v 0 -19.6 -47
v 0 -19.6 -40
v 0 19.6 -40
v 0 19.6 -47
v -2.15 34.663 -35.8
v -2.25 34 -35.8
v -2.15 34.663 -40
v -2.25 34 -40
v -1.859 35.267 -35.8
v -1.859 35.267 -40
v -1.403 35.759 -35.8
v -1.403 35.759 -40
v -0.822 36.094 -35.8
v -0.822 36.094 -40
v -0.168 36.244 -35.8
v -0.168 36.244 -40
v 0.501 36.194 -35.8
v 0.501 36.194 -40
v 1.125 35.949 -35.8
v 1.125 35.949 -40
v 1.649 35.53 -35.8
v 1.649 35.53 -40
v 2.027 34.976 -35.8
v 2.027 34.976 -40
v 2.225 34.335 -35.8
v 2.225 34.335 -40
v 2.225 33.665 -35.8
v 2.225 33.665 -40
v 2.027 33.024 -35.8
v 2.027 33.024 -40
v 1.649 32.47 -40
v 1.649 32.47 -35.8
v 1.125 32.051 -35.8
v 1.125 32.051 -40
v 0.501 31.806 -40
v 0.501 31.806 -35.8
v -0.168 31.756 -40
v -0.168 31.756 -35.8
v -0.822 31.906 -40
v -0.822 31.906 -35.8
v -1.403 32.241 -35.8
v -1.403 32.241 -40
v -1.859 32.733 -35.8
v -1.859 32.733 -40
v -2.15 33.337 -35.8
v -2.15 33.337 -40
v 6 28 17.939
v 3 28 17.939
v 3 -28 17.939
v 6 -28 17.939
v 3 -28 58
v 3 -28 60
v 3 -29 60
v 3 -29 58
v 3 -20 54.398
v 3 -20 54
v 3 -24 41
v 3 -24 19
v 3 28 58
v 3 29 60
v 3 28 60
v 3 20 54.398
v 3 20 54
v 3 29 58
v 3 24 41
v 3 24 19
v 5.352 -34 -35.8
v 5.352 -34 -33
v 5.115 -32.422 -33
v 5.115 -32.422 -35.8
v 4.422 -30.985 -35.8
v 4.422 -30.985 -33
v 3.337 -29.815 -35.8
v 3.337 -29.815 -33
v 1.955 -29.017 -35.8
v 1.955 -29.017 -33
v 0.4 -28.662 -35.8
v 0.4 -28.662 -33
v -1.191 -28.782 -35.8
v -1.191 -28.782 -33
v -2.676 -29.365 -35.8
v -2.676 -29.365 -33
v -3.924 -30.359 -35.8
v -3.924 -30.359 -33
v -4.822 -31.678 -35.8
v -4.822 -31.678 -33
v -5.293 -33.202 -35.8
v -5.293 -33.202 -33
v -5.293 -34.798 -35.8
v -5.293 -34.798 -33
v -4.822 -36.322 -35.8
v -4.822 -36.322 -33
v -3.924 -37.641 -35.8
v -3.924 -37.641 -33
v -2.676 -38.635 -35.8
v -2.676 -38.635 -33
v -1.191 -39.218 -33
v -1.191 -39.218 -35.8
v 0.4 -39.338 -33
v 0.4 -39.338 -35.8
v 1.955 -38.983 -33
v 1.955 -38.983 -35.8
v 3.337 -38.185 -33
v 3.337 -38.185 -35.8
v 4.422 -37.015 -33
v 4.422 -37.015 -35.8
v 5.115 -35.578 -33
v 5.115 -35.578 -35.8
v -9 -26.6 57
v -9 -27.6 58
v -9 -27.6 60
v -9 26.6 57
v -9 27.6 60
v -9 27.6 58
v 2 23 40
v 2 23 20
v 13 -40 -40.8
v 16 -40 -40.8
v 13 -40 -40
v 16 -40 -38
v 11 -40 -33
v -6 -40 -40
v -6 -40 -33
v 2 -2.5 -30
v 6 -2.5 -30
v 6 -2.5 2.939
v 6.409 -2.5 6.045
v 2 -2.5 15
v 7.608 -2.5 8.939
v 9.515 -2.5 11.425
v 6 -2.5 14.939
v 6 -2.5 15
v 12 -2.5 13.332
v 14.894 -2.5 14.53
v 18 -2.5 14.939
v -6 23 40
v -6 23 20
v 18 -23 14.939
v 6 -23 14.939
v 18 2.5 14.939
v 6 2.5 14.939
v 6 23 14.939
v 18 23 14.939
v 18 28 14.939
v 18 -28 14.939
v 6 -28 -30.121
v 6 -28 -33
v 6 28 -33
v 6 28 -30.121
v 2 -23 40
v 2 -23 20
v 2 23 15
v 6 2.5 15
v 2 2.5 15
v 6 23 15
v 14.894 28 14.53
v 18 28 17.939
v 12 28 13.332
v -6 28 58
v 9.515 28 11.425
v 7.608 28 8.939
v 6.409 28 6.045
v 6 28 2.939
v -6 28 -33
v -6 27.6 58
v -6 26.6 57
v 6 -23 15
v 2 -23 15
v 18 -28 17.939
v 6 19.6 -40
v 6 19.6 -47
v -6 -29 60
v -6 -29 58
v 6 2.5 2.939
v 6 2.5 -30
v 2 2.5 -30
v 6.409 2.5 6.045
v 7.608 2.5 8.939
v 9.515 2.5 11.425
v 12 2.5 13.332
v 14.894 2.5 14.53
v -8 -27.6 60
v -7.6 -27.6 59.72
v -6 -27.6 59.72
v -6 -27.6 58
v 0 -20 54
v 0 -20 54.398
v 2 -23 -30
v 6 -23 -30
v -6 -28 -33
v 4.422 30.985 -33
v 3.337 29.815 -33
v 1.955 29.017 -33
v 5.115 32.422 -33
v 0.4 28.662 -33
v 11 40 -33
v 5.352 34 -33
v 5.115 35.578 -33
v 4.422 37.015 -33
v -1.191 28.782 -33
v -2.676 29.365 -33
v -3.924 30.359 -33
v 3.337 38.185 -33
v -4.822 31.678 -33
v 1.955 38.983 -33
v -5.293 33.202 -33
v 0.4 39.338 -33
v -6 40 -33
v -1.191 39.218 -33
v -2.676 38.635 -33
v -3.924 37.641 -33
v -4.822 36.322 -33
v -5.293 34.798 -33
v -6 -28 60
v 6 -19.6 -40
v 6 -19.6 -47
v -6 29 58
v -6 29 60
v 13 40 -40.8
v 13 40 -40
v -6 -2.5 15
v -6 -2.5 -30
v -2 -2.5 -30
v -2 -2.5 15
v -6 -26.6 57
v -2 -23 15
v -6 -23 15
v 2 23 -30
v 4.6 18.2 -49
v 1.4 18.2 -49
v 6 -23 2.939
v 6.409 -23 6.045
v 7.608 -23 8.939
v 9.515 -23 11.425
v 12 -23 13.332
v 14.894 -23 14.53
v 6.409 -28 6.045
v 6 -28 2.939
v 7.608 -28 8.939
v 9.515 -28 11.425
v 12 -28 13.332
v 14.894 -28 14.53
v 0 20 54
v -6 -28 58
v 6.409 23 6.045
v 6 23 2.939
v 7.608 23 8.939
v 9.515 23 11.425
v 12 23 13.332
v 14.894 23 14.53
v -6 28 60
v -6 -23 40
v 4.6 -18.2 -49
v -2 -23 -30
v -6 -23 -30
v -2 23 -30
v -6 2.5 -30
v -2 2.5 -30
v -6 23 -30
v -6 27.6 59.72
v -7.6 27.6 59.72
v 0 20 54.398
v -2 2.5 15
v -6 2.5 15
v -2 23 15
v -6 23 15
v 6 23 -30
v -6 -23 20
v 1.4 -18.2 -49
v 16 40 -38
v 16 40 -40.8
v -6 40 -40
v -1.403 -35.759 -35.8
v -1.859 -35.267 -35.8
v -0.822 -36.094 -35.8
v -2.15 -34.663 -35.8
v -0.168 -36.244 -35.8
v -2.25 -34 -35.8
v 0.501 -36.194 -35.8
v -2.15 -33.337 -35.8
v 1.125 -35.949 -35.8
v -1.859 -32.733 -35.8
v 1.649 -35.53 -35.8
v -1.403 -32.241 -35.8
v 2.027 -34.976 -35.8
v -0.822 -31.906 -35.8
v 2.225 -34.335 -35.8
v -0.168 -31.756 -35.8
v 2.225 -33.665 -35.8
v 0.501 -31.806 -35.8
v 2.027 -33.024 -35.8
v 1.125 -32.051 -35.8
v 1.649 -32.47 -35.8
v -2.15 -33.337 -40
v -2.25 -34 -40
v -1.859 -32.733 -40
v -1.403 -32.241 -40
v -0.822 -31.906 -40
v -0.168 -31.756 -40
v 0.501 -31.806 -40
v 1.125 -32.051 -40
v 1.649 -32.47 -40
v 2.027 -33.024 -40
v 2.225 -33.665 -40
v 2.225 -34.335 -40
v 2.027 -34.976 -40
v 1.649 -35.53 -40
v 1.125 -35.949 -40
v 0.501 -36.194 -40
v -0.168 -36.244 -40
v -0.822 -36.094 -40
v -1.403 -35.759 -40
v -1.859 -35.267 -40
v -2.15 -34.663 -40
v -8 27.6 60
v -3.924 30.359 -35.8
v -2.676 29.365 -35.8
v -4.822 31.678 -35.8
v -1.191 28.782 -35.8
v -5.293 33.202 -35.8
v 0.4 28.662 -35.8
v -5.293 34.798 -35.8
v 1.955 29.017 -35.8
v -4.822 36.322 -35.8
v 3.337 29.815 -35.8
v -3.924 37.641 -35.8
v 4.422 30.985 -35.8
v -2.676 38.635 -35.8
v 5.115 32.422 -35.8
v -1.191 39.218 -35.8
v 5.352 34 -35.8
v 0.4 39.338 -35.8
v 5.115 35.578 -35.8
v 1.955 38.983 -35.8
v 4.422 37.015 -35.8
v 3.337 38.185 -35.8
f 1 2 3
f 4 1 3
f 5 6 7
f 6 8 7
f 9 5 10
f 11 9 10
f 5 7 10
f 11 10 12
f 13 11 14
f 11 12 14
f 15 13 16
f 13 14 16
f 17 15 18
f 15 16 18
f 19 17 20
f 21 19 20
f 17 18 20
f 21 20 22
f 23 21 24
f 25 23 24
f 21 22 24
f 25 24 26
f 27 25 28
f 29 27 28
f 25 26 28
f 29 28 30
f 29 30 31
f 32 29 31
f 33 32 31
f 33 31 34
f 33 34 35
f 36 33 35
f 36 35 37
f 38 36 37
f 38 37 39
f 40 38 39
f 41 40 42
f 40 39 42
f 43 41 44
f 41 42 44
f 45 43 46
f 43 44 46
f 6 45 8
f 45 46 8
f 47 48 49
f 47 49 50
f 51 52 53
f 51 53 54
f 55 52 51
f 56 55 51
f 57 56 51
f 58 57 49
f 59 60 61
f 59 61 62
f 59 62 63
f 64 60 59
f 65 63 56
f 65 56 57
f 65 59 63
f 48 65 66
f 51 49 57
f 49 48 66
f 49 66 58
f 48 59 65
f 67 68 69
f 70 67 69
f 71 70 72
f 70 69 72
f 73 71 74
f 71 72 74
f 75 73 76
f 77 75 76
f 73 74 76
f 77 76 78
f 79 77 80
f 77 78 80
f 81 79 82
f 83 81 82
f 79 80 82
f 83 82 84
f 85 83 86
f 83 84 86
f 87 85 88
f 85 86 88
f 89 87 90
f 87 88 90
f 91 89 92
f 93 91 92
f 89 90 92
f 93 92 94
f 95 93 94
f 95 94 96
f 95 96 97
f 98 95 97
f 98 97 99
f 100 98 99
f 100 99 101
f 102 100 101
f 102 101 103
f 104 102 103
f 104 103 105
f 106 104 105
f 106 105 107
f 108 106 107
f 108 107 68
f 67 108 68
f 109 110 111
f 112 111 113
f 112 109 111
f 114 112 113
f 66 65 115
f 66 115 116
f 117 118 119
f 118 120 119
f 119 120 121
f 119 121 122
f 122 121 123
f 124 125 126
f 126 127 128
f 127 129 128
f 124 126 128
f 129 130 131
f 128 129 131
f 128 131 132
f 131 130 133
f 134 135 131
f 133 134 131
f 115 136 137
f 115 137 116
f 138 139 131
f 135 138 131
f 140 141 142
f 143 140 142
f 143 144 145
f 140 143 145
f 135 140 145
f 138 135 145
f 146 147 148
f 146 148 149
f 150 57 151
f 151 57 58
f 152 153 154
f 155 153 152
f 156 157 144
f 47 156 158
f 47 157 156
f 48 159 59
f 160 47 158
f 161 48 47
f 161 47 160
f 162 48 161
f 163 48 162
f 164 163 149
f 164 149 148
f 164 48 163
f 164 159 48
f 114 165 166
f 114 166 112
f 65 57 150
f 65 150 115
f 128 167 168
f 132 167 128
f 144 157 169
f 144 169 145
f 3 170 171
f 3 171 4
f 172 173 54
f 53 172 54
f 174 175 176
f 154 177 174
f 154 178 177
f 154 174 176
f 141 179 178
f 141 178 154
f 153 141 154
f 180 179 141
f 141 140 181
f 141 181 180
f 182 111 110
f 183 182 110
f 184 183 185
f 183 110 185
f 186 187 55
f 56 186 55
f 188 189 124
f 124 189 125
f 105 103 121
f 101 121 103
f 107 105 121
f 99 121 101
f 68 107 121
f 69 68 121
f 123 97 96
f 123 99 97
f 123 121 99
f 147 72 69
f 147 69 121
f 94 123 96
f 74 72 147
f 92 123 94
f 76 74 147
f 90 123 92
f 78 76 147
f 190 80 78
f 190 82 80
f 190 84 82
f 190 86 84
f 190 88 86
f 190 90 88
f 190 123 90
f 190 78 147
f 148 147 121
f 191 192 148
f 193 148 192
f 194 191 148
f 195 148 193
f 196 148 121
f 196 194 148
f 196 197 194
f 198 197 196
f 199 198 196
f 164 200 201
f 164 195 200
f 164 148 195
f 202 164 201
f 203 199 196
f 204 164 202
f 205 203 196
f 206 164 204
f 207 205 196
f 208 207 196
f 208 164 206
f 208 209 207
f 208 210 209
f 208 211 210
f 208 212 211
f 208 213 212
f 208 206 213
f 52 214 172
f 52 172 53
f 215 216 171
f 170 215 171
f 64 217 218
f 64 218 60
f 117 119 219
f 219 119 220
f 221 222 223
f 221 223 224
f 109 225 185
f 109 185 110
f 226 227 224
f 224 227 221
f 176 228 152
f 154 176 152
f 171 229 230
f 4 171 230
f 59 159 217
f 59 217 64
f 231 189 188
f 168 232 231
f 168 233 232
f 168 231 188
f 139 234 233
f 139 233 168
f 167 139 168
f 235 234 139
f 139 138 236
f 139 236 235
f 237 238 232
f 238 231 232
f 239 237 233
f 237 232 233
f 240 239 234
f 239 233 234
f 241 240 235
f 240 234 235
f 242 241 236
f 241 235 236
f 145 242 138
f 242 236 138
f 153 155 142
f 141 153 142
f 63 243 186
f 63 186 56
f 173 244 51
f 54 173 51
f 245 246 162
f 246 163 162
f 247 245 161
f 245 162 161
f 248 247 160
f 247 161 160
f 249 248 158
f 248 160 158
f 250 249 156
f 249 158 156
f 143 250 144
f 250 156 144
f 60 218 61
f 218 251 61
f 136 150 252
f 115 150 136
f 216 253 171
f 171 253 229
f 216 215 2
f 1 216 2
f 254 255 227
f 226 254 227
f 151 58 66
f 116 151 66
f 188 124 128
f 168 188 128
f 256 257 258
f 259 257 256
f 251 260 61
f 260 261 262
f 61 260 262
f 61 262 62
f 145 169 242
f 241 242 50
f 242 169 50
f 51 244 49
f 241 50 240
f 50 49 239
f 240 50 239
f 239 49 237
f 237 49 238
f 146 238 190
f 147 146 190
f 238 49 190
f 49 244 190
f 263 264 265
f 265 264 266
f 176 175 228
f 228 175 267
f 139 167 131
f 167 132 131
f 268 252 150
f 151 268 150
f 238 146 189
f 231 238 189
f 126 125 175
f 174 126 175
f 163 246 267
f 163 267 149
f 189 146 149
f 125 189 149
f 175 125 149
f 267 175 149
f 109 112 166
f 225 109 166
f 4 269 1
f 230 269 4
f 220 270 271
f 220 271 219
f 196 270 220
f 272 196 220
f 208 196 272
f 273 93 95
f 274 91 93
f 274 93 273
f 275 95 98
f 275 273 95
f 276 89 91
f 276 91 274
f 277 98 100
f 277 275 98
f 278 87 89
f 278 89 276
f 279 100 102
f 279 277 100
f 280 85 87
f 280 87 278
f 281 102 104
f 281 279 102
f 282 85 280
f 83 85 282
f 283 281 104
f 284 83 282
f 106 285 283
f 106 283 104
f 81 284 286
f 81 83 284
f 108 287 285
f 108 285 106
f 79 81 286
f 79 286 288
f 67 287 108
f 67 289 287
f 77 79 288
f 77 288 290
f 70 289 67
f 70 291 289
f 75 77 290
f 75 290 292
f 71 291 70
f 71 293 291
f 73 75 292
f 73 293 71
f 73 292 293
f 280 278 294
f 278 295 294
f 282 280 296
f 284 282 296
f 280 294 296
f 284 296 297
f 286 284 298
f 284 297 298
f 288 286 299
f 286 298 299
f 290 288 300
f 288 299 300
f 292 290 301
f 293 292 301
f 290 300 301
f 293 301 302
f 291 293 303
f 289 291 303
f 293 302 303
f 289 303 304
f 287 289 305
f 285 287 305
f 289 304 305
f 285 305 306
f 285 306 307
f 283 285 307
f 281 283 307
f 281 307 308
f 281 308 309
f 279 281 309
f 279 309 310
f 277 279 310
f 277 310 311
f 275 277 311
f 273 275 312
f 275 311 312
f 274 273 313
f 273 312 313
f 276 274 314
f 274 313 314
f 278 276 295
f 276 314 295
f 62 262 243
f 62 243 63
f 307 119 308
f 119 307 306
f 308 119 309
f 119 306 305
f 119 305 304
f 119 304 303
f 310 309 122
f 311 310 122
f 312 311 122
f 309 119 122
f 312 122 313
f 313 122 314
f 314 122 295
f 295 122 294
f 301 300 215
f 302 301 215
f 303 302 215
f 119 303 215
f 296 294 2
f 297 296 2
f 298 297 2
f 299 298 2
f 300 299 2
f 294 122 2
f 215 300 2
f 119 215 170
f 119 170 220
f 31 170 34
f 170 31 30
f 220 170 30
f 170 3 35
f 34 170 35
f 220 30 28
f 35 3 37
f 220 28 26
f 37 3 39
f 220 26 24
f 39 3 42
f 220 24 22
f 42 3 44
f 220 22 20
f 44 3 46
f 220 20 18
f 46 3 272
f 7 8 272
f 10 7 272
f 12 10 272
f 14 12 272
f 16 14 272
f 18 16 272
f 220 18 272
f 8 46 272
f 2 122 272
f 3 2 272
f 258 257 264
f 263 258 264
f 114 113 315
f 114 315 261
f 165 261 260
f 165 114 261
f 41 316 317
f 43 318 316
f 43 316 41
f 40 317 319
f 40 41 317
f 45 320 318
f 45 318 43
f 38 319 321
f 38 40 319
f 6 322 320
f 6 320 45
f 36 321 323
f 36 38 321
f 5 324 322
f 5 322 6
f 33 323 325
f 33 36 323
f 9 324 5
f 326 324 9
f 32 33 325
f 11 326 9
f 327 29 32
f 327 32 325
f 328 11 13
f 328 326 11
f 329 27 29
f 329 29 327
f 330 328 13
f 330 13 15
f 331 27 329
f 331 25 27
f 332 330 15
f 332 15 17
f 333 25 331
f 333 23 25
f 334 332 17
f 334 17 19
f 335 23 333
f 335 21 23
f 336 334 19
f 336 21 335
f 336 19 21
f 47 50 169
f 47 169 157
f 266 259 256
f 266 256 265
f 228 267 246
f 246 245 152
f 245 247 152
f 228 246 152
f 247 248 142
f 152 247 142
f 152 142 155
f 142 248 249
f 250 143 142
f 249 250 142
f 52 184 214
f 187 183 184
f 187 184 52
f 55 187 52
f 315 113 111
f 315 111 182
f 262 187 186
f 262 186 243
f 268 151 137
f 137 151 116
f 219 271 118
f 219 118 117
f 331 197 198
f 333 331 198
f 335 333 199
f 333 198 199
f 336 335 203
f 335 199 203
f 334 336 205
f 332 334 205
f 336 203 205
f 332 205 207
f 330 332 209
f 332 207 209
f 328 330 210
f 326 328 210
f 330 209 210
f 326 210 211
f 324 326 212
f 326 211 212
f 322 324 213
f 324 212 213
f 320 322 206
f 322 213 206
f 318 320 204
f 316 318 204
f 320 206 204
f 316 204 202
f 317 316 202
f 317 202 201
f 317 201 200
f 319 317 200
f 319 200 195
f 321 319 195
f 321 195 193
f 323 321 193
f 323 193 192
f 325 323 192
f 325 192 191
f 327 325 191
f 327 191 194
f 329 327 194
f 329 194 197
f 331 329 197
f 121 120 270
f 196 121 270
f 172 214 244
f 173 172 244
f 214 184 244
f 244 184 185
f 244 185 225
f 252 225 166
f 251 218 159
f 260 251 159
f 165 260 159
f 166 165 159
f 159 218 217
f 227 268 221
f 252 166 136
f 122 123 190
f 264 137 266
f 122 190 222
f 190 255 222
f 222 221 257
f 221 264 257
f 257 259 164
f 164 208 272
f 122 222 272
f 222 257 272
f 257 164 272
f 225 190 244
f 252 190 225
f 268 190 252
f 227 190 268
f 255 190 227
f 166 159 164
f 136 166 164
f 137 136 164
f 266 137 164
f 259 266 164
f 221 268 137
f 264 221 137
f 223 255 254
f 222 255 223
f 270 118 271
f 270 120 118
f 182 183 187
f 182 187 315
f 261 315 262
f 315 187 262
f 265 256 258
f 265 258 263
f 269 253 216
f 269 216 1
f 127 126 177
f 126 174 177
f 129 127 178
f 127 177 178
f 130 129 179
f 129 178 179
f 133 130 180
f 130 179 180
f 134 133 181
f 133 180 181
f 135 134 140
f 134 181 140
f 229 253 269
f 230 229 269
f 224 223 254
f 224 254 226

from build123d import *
from OCP.BRepFilletAPI import BRepFilletAPI_MakeChamfer

# Parameters (mm, degrees)
SKETCH_1_W              = 12
SKETCH_1_H              = 46
EXTRUDE_1_DEPTH         = 57
SKETCH_2_W              = 20
SKETCH_2_H              = 46.080872769
CUT_EXTRUDE_1_DEPTH     = 60
SKETCH_3_W              = 12
SKETCH_3_H              = 57
EXTRUDE_2_DEPTH         = 5
SKETCH_4_W              = 12
SKETCH_4_H              = 56
EXTRUDE_3_DEPTH         = 40
SKETCH_5_W              = 12
SKETCH_5_H              = 7
EXTRUDE_4_DEPTH         = 12
M4_A_1_D                = 4.5
M4_A_1_CBORE_D          = 10.705
M4_A_1_CBORE_DEPTH      = 2.8
SKETCH_8_W              = 15
SKETCH_8_H              = 56
EXTRUDE_5_DEPTH         = 3
SKETCH_9_W              = 6
SKETCH_9_H              = 40
CUT_EXTRUDE_2_DEPTH     = 6
CHAMFER_1_SIZE          = 8
CHAMFER_1_SIZE_2        = 5.601660306
SKETCH_10_W             = 6
SKETCH_10_H             = 39.2
EXTRUDE_6_DEPTH         = 9
CUT_EXTRUDE_START       = -4
CUT_EXTRUDE_3_OUTLINE_W = 3
CUT_EXTRUDE_3_OUTLINE_H = 0.4
CUT_EXTRUDE_3_DEPTH     = 5
CHAMFER_2_SIZE          = 1
CHAMFER_3_SIZE          = 2
CHAMFER_3_SIZE2         = 1.400415076
SKETCH_12_W             = 45
SKETCH_12_H             = 20.5
CUT_EXTRUDE_4_DEPTH     = 4
SKETCH_14_W             = 7
SKETCH_14_H             = 80
EXTRUDE_7_DEPTH         = 10
CUT_EXTRUDE_5_DEPTH     = 102.271911209
SKETCH_16_W             = 3
SKETCH_16_H             = 56
EXTRUDE_8_DEPTH         = 12
CHAMFER_5_SIZE          = 5
CUT_EXTRUDE_START_2     = -42.060641
SKETCH_17_W             = 3
SKETCH_17_H             = 56
CUT_EXTRUDE_6_DEPTH     = 42.060641
CHAMFER_4_SIZE          = 1
FILLET_1_R              = 12
SKETCH_22_W             = 3
SKETCH_22_H             = 80
EXTRUDE_11_DEPTH        = 0.8
SKETCH_24_W             = 9
SKETCH_24_H             = 2
EXTRUDE_13_DEPTH        = 1


with BuildPart() as part:
    # 스케치1 → 보스-돌출1 (new body)
    with BuildSketch(Plane.XY):
        Rectangle(SKETCH_1_W, SKETCH_1_H)
    extrude(amount=EXTRUDE_1_DEPTH)

    # 스케치2 → 컷-돌출1 (cut)
    with BuildSketch(Plane(origin=(6, 0, 0), x_dir=(0, 0, -1), z_dir=(1, 0, 0))):
        with Locations((-30, 0.040436385)):
            Rectangle(SKETCH_2_W, SKETCH_2_H)
    extrude(amount=-CUT_EXTRUDE_1_DEPTH, mode=Mode.SUBTRACT)


with BuildPart() as cut_extrude_1_piece_1:
    # of the separate pieces the step leaves, piece 1, a body of its own (cut_extrude_1_pieces)
    add(part.part.solids().sort_by_distance((-6, 23, 0))[0])



with BuildPart() as cut_extrude_1_piece_2:
    # of the separate pieces the step leaves, piece 2, a body of its own (cut_extrude_1_pieces)
    add(part.part.solids().sort_by_distance((6, 23, 40))[0])


with BuildPart() as cut_extrude_1_piece_1_1:
    add(cut_extrude_1_piece_1.part)

    add(cut_extrude_1_piece_2.part)  # 보스-돌출2 merges 컷-돌출1 piece 2
    # 스케치3 → 보스-돌출2 (add)
    with BuildSketch(Plane.XZ.offset(23)):
        with Locations((0, 28.5)):
            Rectangle(SKETCH_3_W, SKETCH_3_H)
    extrude_2 = extrude(amount=EXTRUDE_2_DEPTH)

    # 대칭 복사1: 보스-돌출2 across plane
    add(extrude_2.mirror(Plane.ZX))

    # 스케치4 → 보스-돌출3 (add)
    with BuildSketch(Plane(origin=(0, 0, 0), x_dir=(-1, 0, 0), z_dir=(0, 0, -1))):
        Rectangle(SKETCH_4_W, SKETCH_4_H)
    extrude(amount=EXTRUDE_3_DEPTH)

    # 스케치5 → 보스-돌출4 (add)
    with BuildSketch(Plane.XZ.offset(28)):
        with Locations((0, -36.5)):
            Rectangle(SKETCH_5_W, SKETCH_5_H)
    extrude_4 = extrude(amount=EXTRUDE_4_DEPTH)

    # 대칭 복사2: 보스-돌출4 across plane
    add(extrude_4.mirror(Plane.ZX))

    # M4 육각 머리 볼트용 카운터보어 (A 등급)1 (through all)
    with Locations(Plane.XY.offset(-33)):
        with Locations((0, -34), (0, 34)):
            CounterBoreHole(M4_A_1_D / 2, M4_A_1_CBORE_D / 2, M4_A_1_CBORE_DEPTH)

    # 스케치8 → 보스-돌출5 (add)
    with BuildSketch(Plane.XY.offset(57)):
        with Locations((-1.5, 0)):
            Rectangle(SKETCH_8_W, SKETCH_8_H)
    extrude(amount=EXTRUDE_5_DEPTH)

    # 스케치9 → 컷-돌출2 (cut)
    with BuildSketch(Plane.XY.offset(60)):
        with Locations((3, 0)):
            Rectangle(SKETCH_9_W, SKETCH_9_H)
    extrude(amount=-CUT_EXTRUDE_2_DEPTH, mode=Mode.SUBTRACT)

    # 모따기1
    chamfer_1_edges_1 = [cut_extrude_1_piece_1_1.edges().sort_by_distance(p)[0] for p in [
        (0, 0, 60),
    ]]
    chamfer_1_side_1 = [cut_extrude_1_piece_1_1.faces().sort_by_distance(p)[0] for p in [
        (-0.112033206, 0, 60),
    ]]
    chamfer_1_edges_2 = [cut_extrude_1_piece_1_1.edges().sort_by_distance(p)[0] for p in [
        (3, 20, 60),
    ]]
    chamfer_1_side_2 = [cut_extrude_1_piece_1_1.faces().sort_by_distance(p)[0] for p in [
        (3, 20.112033206, 60),
    ]]
    chamfer_1_edges_3 = [cut_extrude_1_piece_1_1.edges().sort_by_distance(p)[0] for p in [
        (3, -20, 60),
    ]]
    chamfer_1_side_3 = [cut_extrude_1_piece_1_1.faces().sort_by_distance(p)[0] for p in [
        (3, -20.112033206, 60),
    ]]
    chamfer_1 = BRepFilletAPI_MakeChamfer(cut_extrude_1_piece_1_1.part.solid().wrapped)
    for e in chamfer_1_edges_1:
        chamfer_1.Add(CHAMFER_1_SIZE - 0.0001, CHAMFER_1_SIZE_2 - 0.0001, e.wrapped, chamfer_1_side_1[0].wrapped)
    for e in chamfer_1_edges_2:
        chamfer_1.Add(CHAMFER_1_SIZE - 0.0001, CHAMFER_1_SIZE_2 - 0.0001, e.wrapped, chamfer_1_side_2[0].wrapped)
    for e in chamfer_1_edges_3:
        chamfer_1.Add(CHAMFER_1_SIZE - 0.0001, CHAMFER_1_SIZE_2 - 0.0001, e.wrapped, chamfer_1_side_3[0].wrapped)
    add(Compound.cast(chamfer_1.Shape()), mode=Mode.REPLACE)  # a hair under: the kernel refuses the full size

    # 스케치10 → 보스-돌출6 (add)
    with BuildSketch(Plane(origin=(0, 0, -40), x_dir=(-1, 0, 0), z_dir=(0, 0, -1))):
        with Locations((-3, 0)):
            Rectangle(SKETCH_10_W, SKETCH_10_H)
    extrude(amount=EXTRUDE_6_DEPTH)

    # 컷-돌출3: read off the stored shape, not the designer's step
    # 컷-돌출3 outline → 컷-돌출3 (cut)
    with BuildSketch(Plane.XY.offset(60).offset(CUT_EXTRUDE_START)):
        with Locations((-7.5, 27.8)):
            Rectangle(CUT_EXTRUDE_3_OUTLINE_W, CUT_EXTRUDE_3_OUTLINE_H)
        with Locations((-7.5, -27.8)):
            Rectangle(CUT_EXTRUDE_3_OUTLINE_W, CUT_EXTRUDE_3_OUTLINE_H)
    extrude(amount=CUT_EXTRUDE_3_DEPTH, mode=Mode.SUBTRACT)

    # 모따기2
    chamfer_2_edges = [cut_extrude_1_piece_1_1.edges().sort_by_distance(p)[0] for p in [
        (-7.5, -27.6, 57),
        (-7.5, 27.6, 57),
    ]]
    chamfer(chamfer_2_edges, length=CHAMFER_2_SIZE)

    # 모따기3: one chamfer whose edges measure the first distance from different faces: ONE call of the kernel's chamfer builder (chamfer() names one face for all edges)
    chamfer_3_edges_1 = [cut_extrude_1_piece_1_1.edges().sort_by_distance(p)[0] for p in [
        (6, 0, -49),
    ]]
    chamfer_3_side_1 = [cut_extrude_1_piece_1_1.faces().sort_by_distance(p)[0] for p in [
        (6, 0, -1.976539193),
    ]]
    chamfer_3_edges_2 = [cut_extrude_1_piece_1_1.edges().sort_by_distance(p)[0] for p in [
        (3, -19.6, -49),
    ]]
    chamfer_3_side_2 = [cut_extrude_1_piece_1_1.faces().sort_by_distance(p)[0] for p in [
        (3, -19.6, -44.5),
    ]]
    chamfer_3_edges_3 = [cut_extrude_1_piece_1_1.edges().sort_by_distance(p)[0] for p in [
        (0, 0, -49),
    ]]
    chamfer_3_side_3 = [cut_extrude_1_piece_1_1.faces().sort_by_distance(p)[0] for p in [
        (0, 0, -44.5),
    ]]
    chamfer_3_edges_4 = [cut_extrude_1_piece_1_1.edges().sort_by_distance(p)[0] for p in [
        (3, 19.6, -49),
    ]]
    chamfer_3_side_4 = [cut_extrude_1_piece_1_1.faces().sort_by_distance(p)[0] for p in [
        (3, 19.6, -44.5),
    ]]
    chamfer_3 = BRepFilletAPI_MakeChamfer(cut_extrude_1_piece_1_1.part.solid().wrapped)
    for e in chamfer_3_edges_1:
        chamfer_3.Add(CHAMFER_3_SIZE, CHAMFER_3_SIZE2, e.wrapped, chamfer_3_side_1[0].wrapped)  # the first distance lies on this face
    for e in chamfer_3_edges_2:
        chamfer_3.Add(CHAMFER_3_SIZE, CHAMFER_3_SIZE2, e.wrapped, chamfer_3_side_2[0].wrapped)  # the first distance lies on this face
    for e in chamfer_3_edges_3:
        chamfer_3.Add(CHAMFER_3_SIZE, CHAMFER_3_SIZE2, e.wrapped, chamfer_3_side_3[0].wrapped)  # the first distance lies on this face
    for e in chamfer_3_edges_4:
        chamfer_3.Add(CHAMFER_3_SIZE, CHAMFER_3_SIZE2, e.wrapped, chamfer_3_side_4[0].wrapped)  # the first distance lies on this face
    add(Compound.cast(chamfer_3.Shape()), mode=Mode.REPLACE)

    # 스케치12 → 컷-돌출4 (cut)
    with BuildSketch(Plane.ZY.offset(6)):
        with Locations((-7.5, 12.75)):
            Rectangle(SKETCH_12_W, SKETCH_12_H)
        with Locations((-7.5, -12.75)):
            Rectangle(SKETCH_12_W, SKETCH_12_H)
    cut_extrude_4 = extrude(amount=-CUT_EXTRUDE_4_DEPTH, mode=Mode.SUBTRACT)

    # 대칭 복사3: 컷-돌출4 across plane
    add(cut_extrude_4.mirror(Plane.ZY), mode=Mode.SUBTRACT)

    # 스케치14 → 보스-돌출7 (add)
    with BuildSketch(Plane(origin=(6, 0, 0), x_dir=(0, 0, -1), z_dir=(1, 0, 0))):
        with Locations((36.5, 0)):
            Rectangle(SKETCH_14_W, SKETCH_14_H)
    extrude(amount=EXTRUDE_7_DEPTH)

    # 스케치15 → 컷-돌출5 (cut, through all)
    with BuildSketch(Plane.XZ.offset(40)):
        with BuildLine():
            Line((6, -33), (16, -33))
            Line((16, -33), (16, -28.353890031))
            add(Edge.make_bspline(
                [(6, -33), (5.579283, -24.005465365), (9.542787604, -28.181394392), (15.145388019, -28.353890031), (16, -28.353890031)],
                knots=[0, 0, 0, 0, 0.752787833, 1, 1, 1, 1], degree=3))
        make_face()
    extrude(amount=-CUT_EXTRUDE_5_DEPTH, mode=Mode.SUBTRACT)

    # 스케치16 → 보스-돌출8 (add)
    with BuildSketch(Plane(origin=(6, 0, 0), x_dir=(0, 0, -1), z_dir=(1, 0, 0))):
        with Locations((-16.43935887, 0)):
            Rectangle(SKETCH_16_W, SKETCH_16_H)
    extrude(amount=EXTRUDE_8_DEPTH)

    # 모따기5
    chamfer_5_edges = [cut_extrude_1_piece_1_1.edges().sort_by_distance(p)[0] for p in [
        (16, 0, -33),
    ]]
    chamfer(chamfer_5_edges, length=CHAMFER_5_SIZE)

    # 스케치17 → 컷-돌출6 (cut)
    with BuildSketch(Plane.XY.offset(60).offset(CUT_EXTRUDE_START_2)):
        with Locations((4.5, 0)):
            Rectangle(SKETCH_17_W, SKETCH_17_H)
    extrude(amount=CUT_EXTRUDE_6_DEPTH, mode=Mode.SUBTRACT)

    # 모따기4
    chamfer_4_edges = [cut_extrude_1_piece_1_1.edges().sort_by_distance(p)[0] for p in [
        (3, -23, 30),
        (3, 23, 30),
        (3, 0, 20),
        (3, 0, 40),
    ]]
    chamfer(chamfer_4_edges, length=CHAMFER_4_SIZE)

    # 필렛1
    fillet_1_edges = [cut_extrude_1_piece_1_1.edges().sort_by_distance(p)[0] for p in [
        (6, -25.5, 14.93935887),
        (6, 0, 14.93935887),
        (6, 25.5, 14.93935887),
    ]]
    fillet(fillet_1_edges, radius=FILLET_1_R - 0.0001)  # a hair under: the kernel refuses the full size

    # 스케치22 → 보스-돌출11 (add)
    with BuildSketch(Plane(origin=(0, 0, -40), x_dir=(-1, 0, 0), z_dir=(0, 0, -1))):
        with Locations((-14.5, 0)):
            Rectangle(SKETCH_22_W, SKETCH_22_H)
    extrude(amount=EXTRUDE_11_DEPTH)

    # 스케치24 → 보스-돌출13 (add)
    with BuildSketch(Plane(origin=(0, 28, 0), x_dir=(1, 0, 0), z_dir=(0, 1, 0))):
        with Locations((-1.5, -59)):
            Rectangle(SKETCH_24_W, SKETCH_24_H)
    extrude_13 = extrude(amount=EXTRUDE_13_DEPTH)

    # 대칭 복사4: 보스-돌출13 across plane
    add(extrude_13.mirror(Plane.ZX))


solid = cut_extrude_1_piece_1_1.part
